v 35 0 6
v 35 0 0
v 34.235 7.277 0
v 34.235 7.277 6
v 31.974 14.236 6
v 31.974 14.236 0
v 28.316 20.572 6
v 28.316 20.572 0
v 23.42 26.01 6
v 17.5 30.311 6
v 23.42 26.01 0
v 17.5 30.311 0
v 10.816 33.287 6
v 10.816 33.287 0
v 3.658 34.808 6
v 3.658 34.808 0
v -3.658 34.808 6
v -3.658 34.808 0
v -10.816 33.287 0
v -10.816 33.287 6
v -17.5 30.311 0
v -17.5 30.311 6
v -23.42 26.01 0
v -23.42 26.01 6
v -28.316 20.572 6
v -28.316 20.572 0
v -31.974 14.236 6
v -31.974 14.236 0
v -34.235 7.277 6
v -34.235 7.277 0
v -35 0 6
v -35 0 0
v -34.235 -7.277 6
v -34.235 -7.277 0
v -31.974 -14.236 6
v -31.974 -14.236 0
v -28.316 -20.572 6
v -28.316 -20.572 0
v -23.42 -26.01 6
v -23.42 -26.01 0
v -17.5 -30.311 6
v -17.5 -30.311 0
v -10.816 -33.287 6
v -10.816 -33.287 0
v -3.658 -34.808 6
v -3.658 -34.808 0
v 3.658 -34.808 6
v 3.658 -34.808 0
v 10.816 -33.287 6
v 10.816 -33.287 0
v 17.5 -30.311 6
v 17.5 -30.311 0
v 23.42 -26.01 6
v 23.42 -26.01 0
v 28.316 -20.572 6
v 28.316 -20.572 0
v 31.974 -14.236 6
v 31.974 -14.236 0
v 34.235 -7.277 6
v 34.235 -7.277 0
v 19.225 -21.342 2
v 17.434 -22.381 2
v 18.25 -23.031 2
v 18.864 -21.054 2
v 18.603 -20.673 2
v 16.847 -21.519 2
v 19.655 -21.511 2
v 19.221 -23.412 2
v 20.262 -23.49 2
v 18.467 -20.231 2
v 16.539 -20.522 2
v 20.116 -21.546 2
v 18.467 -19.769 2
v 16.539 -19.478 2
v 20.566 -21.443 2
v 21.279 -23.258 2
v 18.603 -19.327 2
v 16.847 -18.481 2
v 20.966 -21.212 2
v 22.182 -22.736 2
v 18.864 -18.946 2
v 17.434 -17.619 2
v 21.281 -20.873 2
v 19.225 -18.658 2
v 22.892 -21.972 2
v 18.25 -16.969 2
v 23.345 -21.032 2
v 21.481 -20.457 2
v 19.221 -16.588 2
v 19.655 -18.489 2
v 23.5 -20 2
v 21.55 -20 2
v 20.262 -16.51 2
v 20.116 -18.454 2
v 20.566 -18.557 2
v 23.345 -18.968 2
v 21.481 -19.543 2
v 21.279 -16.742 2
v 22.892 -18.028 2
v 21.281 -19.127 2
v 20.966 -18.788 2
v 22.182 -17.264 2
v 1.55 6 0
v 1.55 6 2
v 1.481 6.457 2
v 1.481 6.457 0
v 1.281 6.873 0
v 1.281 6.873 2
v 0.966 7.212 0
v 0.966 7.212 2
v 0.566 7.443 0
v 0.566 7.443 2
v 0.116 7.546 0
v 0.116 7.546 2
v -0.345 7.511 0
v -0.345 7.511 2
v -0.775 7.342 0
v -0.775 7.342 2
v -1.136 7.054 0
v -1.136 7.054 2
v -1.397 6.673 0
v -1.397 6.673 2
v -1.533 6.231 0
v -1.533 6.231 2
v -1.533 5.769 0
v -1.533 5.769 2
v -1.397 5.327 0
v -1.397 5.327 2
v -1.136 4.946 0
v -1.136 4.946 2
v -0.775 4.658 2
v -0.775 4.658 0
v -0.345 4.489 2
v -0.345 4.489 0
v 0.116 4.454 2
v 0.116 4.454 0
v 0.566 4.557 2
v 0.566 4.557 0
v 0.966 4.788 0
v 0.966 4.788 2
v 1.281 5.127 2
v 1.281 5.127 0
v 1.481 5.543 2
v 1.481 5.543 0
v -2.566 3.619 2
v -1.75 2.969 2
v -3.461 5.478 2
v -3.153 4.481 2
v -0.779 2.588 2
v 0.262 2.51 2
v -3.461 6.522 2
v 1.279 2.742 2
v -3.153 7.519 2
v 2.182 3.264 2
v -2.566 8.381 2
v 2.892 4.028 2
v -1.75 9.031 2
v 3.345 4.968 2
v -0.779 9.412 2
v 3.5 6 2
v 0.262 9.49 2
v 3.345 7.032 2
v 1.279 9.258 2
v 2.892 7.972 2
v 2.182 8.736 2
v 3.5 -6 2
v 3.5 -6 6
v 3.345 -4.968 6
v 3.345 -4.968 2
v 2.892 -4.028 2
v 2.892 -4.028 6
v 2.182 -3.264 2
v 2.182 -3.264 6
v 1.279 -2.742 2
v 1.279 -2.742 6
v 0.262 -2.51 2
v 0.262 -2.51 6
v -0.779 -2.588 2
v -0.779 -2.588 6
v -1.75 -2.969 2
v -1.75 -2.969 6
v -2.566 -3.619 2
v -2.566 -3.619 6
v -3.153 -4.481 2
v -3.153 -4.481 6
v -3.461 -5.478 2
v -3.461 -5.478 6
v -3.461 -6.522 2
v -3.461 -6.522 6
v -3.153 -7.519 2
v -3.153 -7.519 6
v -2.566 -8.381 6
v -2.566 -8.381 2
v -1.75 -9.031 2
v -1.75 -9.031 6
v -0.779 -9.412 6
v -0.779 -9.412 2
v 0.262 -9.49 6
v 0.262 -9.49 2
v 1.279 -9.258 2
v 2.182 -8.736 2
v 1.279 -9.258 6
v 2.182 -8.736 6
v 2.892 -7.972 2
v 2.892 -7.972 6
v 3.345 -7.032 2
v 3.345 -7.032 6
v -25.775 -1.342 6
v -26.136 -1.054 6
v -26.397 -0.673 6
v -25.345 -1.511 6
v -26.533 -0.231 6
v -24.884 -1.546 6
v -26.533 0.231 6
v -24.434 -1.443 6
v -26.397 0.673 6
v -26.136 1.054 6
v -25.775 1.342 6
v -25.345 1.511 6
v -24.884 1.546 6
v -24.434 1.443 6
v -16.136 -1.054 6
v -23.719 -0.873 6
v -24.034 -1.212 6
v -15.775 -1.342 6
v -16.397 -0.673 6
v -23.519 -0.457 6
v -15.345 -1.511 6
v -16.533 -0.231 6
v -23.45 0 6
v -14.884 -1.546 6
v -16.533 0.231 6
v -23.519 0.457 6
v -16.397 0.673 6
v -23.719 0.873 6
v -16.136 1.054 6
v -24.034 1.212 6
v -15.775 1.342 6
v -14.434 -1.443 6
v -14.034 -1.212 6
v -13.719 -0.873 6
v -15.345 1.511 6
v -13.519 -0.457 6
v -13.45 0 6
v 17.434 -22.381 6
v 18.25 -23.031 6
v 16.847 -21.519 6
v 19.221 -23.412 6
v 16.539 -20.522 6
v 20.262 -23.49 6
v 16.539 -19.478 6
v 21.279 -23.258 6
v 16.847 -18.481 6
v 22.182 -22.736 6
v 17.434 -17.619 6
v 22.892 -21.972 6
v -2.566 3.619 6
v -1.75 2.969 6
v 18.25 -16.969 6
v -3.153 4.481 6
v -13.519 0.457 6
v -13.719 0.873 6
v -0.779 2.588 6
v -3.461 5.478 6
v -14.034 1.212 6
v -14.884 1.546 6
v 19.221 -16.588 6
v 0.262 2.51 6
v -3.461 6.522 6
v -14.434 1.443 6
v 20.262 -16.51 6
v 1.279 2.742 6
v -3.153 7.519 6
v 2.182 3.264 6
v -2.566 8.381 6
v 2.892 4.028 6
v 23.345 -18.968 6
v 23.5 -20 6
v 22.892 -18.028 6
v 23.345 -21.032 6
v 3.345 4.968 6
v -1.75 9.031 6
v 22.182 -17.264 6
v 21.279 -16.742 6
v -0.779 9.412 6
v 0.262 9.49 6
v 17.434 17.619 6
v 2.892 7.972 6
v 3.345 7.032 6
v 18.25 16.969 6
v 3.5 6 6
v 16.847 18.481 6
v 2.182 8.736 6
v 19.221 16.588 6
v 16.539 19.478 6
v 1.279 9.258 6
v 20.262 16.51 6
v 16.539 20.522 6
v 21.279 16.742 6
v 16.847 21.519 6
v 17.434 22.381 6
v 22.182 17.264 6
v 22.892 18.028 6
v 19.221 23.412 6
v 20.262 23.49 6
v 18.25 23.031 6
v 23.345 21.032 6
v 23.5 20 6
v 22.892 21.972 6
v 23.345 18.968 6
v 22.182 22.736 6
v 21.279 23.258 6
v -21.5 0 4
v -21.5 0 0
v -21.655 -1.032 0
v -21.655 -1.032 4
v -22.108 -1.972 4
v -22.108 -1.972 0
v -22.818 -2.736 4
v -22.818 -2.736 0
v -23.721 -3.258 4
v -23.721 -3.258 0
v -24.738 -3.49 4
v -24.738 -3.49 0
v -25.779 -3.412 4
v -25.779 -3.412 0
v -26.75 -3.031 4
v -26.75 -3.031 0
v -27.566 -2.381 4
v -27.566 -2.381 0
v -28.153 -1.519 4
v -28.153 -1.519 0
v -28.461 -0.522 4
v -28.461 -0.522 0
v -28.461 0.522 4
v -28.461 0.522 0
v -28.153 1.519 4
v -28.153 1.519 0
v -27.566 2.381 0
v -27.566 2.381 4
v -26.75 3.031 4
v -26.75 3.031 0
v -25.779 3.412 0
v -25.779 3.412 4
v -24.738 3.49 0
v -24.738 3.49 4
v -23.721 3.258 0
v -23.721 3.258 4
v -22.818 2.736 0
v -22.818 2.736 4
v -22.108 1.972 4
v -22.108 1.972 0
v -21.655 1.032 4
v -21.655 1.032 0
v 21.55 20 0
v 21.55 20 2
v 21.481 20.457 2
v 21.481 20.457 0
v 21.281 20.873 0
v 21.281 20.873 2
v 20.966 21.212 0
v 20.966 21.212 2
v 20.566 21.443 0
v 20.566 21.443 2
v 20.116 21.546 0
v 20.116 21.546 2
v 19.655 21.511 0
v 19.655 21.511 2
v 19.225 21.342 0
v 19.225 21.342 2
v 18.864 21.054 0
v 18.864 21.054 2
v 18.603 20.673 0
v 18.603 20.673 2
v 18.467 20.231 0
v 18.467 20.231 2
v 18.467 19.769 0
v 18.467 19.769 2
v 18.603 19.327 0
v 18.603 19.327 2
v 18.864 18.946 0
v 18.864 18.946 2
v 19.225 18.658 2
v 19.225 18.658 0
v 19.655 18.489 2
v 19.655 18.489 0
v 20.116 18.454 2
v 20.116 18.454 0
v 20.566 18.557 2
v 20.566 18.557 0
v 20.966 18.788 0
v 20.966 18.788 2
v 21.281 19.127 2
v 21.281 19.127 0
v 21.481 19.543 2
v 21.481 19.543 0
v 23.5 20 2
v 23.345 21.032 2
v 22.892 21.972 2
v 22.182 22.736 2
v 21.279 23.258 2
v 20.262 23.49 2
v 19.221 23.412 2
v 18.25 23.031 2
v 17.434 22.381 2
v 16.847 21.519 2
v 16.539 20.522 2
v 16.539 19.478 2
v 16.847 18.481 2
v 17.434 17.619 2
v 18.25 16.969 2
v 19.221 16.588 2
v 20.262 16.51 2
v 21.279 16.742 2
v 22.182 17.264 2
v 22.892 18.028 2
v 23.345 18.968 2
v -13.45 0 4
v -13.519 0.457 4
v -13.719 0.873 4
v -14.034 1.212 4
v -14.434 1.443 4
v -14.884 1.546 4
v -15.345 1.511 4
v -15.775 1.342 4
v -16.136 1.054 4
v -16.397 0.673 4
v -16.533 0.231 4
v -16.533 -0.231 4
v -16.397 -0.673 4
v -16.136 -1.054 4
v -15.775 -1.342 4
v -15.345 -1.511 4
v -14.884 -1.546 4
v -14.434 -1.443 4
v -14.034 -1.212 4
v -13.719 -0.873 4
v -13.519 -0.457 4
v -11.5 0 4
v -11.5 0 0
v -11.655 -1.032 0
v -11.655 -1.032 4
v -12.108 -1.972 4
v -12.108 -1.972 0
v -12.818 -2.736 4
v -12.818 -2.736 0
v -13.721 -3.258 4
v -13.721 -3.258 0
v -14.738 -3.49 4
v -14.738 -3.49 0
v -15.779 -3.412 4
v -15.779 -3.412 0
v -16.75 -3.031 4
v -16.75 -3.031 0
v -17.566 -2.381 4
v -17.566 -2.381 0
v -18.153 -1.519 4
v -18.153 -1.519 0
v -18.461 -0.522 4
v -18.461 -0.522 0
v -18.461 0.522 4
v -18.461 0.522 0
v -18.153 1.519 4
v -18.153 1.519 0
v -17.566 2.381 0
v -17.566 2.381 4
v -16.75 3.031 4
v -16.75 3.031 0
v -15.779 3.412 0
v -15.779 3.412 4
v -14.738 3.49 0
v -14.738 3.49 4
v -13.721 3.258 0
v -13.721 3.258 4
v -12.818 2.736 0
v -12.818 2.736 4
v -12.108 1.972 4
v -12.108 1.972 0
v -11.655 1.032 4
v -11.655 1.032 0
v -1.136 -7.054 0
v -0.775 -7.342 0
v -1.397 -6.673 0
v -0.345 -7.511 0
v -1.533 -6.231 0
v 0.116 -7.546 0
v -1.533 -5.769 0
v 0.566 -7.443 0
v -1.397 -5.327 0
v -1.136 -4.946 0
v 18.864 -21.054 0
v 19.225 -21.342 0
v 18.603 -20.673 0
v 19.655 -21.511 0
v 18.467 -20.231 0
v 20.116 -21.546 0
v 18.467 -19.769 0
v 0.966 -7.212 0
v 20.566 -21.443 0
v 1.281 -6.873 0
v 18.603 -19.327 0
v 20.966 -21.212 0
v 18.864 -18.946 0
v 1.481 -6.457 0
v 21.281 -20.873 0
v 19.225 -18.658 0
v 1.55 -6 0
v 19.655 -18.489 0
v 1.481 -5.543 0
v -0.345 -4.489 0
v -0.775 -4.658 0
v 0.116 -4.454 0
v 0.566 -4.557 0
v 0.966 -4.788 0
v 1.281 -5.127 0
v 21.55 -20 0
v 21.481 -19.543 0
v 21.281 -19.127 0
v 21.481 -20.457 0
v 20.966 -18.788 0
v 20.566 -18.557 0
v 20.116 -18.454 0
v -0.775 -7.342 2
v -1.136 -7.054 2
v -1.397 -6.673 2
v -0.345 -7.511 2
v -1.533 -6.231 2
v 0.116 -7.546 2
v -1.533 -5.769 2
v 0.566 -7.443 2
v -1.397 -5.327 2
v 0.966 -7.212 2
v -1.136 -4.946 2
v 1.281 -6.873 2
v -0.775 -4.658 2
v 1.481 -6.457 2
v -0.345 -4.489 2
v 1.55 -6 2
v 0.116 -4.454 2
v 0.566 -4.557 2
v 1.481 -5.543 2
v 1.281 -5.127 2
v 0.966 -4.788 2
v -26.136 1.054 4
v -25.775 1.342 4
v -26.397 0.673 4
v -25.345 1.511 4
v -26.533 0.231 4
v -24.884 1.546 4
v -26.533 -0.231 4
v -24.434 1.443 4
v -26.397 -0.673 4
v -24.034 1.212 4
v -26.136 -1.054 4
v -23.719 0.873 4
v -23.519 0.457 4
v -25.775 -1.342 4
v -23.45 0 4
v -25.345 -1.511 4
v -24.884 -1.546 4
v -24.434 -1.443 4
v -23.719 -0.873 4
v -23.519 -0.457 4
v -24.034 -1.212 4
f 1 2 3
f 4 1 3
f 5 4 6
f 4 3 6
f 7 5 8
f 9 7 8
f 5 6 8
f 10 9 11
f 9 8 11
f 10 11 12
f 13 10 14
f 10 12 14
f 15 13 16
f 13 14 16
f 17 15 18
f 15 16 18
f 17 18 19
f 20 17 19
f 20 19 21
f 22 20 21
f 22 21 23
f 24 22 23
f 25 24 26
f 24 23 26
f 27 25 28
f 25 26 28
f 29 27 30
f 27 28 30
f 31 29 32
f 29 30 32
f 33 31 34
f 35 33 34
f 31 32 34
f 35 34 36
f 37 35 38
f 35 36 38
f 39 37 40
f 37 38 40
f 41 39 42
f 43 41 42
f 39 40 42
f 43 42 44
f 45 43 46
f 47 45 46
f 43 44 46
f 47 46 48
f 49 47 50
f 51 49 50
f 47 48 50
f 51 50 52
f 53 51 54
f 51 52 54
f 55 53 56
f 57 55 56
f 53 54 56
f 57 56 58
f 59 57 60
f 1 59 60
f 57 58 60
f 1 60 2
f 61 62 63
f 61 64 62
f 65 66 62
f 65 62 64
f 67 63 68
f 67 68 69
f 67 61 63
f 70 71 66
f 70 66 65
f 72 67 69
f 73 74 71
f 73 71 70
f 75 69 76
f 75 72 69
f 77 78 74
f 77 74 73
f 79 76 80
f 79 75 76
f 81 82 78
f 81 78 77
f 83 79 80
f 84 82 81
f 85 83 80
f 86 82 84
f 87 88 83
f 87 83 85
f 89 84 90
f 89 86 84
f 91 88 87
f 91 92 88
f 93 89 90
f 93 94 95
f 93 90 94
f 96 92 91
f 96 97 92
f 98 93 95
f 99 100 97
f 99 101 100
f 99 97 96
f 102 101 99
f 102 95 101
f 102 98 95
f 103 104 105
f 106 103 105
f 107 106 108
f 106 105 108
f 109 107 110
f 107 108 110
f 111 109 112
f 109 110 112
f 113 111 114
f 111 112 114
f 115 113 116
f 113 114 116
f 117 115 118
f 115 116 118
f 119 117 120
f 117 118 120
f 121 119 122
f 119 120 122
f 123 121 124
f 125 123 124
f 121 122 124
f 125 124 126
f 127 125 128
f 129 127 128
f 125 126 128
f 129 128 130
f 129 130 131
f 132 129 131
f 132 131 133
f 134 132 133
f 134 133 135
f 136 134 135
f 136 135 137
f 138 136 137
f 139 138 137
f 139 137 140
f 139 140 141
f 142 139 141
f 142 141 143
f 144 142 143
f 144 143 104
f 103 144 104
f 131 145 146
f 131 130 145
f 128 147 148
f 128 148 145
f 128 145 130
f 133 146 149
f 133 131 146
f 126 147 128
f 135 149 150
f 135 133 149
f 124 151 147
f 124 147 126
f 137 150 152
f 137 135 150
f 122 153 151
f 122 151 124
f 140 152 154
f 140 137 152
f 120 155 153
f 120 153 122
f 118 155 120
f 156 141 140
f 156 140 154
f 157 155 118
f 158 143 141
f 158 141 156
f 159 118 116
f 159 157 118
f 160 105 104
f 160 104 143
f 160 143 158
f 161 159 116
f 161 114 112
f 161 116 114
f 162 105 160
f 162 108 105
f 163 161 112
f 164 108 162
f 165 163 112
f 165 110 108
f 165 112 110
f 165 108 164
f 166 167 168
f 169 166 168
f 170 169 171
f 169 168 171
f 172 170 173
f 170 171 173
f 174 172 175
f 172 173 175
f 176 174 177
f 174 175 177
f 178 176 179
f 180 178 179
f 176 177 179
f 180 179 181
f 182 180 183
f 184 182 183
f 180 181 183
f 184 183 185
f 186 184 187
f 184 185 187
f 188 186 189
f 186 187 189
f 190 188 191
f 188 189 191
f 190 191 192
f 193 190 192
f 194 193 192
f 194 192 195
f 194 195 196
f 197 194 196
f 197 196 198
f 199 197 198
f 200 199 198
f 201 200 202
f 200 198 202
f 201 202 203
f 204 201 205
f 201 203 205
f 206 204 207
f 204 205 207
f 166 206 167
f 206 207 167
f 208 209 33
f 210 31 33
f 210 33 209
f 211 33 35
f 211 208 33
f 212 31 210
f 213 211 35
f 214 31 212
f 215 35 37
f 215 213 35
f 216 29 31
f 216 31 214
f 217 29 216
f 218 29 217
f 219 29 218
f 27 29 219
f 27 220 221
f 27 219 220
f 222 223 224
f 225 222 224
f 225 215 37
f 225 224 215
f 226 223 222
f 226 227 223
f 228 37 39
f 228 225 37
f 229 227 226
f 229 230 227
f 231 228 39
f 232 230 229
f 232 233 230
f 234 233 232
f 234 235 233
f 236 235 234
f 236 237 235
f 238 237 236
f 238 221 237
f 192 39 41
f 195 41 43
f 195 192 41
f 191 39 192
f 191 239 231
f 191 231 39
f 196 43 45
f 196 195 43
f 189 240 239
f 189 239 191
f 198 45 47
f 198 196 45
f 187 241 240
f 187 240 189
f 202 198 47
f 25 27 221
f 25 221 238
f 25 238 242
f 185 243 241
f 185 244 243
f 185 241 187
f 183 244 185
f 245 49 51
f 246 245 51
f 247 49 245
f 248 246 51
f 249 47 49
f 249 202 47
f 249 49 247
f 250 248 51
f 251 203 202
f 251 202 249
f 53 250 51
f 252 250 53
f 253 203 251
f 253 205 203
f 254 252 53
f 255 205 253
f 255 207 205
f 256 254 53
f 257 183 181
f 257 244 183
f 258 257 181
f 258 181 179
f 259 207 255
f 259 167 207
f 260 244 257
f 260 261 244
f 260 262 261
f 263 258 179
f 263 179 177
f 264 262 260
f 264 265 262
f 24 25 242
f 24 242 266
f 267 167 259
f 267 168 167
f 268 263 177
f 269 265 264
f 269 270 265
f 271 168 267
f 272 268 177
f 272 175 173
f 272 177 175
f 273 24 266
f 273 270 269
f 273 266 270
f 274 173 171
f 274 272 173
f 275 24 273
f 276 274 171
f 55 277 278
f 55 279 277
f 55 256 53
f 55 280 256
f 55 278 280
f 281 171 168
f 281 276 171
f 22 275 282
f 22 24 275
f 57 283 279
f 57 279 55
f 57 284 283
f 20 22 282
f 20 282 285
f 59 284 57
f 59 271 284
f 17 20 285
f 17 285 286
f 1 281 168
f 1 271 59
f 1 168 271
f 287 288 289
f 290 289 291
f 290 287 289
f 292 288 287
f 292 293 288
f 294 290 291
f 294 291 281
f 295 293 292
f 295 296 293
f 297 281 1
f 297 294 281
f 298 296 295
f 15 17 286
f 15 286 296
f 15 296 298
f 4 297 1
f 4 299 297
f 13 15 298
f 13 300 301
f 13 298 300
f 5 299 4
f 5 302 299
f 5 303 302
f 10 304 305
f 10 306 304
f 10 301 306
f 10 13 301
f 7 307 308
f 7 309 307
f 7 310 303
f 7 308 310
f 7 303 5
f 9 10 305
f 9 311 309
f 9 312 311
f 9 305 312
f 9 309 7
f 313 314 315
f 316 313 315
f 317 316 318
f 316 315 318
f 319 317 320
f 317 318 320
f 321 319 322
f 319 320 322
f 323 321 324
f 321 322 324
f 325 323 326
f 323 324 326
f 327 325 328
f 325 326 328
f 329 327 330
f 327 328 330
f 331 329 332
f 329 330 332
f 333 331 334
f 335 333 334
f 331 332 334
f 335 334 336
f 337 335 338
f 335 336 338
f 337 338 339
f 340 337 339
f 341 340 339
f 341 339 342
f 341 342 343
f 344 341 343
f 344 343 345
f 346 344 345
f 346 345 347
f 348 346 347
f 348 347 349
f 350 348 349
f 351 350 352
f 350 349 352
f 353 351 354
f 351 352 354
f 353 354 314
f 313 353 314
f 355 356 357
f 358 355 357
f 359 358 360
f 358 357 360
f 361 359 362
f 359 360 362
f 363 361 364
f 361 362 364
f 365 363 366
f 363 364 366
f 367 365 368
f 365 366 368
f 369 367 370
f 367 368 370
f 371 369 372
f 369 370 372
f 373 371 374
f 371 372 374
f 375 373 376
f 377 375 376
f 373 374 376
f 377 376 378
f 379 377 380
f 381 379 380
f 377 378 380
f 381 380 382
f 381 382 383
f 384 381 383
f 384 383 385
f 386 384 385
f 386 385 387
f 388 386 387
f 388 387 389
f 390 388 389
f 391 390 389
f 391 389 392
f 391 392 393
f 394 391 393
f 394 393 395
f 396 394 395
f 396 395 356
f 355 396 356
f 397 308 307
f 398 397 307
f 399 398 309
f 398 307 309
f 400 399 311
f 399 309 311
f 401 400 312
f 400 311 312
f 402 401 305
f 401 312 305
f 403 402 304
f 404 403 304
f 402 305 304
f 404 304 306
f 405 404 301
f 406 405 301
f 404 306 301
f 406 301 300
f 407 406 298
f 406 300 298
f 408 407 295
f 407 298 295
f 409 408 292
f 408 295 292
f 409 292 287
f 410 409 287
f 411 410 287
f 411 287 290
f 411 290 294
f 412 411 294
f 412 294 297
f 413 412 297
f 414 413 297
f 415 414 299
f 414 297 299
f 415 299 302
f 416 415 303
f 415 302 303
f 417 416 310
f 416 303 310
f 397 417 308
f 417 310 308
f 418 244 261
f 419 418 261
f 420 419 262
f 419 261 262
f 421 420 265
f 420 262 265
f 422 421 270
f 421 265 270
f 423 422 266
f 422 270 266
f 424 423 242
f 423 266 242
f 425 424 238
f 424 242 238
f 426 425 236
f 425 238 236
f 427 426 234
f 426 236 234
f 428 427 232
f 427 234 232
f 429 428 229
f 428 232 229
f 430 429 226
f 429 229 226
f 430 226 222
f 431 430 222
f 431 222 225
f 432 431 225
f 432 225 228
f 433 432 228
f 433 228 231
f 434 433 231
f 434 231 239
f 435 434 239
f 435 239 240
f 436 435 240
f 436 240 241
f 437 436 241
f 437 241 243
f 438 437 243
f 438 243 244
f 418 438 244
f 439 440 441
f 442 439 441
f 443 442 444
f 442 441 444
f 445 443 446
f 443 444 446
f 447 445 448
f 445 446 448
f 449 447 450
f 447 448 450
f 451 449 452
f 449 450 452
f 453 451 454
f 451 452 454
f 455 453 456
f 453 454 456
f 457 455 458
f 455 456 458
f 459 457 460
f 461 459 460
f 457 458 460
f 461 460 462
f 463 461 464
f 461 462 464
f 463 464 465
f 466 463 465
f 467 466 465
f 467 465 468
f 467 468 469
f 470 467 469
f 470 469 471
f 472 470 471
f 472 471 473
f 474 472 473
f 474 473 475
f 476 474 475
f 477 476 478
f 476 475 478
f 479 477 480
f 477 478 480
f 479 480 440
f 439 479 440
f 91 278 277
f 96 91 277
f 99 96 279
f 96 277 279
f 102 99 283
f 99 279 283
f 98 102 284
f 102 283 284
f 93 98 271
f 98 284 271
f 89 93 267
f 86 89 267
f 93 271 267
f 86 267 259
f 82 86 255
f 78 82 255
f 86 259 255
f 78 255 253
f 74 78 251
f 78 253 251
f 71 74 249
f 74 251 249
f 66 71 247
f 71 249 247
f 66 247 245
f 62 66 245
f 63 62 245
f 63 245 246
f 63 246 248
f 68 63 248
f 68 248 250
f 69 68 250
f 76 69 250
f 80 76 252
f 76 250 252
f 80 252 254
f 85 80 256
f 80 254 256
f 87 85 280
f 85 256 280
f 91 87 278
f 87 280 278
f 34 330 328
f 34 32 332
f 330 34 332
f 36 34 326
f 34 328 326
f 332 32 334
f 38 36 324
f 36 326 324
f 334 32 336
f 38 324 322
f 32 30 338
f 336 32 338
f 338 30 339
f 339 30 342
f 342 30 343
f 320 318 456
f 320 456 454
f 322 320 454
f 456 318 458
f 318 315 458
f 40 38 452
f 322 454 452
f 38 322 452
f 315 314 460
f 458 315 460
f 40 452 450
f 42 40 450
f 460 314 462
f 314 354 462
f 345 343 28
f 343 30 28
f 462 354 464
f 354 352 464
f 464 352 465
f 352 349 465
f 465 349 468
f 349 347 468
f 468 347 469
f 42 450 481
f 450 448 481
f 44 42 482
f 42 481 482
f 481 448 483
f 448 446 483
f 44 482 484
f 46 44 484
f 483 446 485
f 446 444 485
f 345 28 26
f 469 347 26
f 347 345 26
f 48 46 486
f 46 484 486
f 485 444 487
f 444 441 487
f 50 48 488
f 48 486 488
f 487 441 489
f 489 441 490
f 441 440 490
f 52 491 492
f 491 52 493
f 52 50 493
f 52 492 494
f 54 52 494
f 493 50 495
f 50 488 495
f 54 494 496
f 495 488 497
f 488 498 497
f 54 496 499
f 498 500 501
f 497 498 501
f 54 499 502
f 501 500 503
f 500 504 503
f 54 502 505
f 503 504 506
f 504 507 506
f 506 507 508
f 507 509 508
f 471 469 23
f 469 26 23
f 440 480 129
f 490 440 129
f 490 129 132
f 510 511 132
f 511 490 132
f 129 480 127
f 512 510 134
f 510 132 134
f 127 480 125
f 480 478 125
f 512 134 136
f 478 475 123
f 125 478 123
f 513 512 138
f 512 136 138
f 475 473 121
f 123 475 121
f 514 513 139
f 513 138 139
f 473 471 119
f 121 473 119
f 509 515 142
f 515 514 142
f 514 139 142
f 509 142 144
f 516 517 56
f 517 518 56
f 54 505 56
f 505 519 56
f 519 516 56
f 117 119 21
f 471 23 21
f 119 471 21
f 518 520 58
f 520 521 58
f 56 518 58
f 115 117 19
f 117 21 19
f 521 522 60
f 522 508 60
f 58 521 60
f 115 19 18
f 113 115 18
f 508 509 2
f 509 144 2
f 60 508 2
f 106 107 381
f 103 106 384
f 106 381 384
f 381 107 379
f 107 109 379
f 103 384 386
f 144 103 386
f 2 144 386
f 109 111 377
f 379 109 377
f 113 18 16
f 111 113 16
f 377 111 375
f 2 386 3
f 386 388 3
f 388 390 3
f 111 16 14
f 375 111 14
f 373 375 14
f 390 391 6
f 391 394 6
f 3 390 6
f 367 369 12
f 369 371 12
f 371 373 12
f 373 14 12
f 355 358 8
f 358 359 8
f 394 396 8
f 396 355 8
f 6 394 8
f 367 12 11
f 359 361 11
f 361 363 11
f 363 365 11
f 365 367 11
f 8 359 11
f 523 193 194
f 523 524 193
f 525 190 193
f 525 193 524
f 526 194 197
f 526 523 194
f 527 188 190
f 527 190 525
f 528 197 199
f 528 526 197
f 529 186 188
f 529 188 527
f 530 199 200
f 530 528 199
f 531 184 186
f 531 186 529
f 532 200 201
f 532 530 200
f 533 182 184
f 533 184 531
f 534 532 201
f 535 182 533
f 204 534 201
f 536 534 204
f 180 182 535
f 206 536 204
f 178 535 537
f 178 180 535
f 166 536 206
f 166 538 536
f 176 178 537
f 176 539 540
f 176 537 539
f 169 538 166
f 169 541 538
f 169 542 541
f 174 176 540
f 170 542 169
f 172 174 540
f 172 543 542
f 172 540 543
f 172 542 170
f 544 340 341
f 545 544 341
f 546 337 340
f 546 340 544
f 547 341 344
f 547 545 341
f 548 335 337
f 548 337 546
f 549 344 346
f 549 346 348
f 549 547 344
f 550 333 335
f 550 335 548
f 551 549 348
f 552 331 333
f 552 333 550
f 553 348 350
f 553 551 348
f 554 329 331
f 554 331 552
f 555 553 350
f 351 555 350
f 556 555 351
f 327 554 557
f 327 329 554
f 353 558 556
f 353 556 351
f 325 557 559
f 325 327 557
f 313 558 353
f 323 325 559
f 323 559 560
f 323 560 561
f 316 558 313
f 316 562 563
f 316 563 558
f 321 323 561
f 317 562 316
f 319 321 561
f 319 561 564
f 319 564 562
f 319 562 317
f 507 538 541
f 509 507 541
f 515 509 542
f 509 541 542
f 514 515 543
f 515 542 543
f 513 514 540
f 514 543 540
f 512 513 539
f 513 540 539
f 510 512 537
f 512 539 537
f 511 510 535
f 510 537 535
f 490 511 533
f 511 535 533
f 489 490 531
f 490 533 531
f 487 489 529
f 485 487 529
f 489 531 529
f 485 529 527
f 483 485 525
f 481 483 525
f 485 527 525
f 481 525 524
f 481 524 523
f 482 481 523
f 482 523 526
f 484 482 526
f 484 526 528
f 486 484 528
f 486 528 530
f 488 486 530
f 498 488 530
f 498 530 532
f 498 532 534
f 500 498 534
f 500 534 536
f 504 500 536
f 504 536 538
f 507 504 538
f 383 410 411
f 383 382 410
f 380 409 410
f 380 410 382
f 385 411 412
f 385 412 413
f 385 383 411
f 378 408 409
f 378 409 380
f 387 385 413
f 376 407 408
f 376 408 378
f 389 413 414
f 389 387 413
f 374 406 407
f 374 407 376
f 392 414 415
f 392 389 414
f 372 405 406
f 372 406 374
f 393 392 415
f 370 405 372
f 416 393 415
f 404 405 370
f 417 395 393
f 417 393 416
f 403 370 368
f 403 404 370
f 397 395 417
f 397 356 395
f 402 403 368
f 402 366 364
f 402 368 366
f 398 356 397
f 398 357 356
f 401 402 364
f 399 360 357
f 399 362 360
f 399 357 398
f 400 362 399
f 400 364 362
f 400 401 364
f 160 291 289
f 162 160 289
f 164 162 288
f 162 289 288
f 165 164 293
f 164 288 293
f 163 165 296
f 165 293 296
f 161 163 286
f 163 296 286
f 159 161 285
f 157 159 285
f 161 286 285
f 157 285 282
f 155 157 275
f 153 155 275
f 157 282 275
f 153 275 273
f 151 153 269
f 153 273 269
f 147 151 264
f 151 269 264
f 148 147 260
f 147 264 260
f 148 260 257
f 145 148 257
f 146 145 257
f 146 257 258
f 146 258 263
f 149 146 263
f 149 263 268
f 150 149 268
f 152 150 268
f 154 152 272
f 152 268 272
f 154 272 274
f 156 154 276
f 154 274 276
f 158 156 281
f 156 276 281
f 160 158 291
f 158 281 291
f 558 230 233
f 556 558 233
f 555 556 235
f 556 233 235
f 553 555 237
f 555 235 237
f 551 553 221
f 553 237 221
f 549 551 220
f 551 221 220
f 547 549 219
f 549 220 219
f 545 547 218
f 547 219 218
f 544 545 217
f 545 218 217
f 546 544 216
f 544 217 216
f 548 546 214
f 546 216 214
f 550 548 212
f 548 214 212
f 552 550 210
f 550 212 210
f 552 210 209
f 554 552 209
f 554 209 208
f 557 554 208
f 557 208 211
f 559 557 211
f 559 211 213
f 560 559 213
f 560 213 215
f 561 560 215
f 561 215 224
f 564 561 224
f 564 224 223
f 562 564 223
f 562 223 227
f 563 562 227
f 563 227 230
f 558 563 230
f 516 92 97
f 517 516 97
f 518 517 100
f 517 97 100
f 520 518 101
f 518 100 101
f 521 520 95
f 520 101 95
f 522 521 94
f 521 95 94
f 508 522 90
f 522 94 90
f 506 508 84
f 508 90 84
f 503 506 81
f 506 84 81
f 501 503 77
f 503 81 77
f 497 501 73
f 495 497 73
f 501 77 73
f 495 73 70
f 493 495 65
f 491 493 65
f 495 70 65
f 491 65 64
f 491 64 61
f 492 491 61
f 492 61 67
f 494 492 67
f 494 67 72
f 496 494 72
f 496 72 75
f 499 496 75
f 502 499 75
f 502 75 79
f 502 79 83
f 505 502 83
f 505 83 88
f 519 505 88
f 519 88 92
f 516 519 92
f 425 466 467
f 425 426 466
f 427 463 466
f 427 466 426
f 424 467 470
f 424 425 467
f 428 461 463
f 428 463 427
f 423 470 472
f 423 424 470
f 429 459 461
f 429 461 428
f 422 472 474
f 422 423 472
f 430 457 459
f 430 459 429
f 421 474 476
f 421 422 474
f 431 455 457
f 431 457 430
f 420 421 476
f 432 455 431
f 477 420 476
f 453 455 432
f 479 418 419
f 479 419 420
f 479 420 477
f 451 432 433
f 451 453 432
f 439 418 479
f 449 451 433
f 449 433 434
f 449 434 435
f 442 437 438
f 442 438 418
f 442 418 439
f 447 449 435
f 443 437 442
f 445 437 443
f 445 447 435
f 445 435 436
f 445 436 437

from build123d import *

# Parameters (mm, degrees)
F0_R     = 35
F1_DEPTH = 6
F2_R     = 1.55
F3_DEPTH = 6
F4_R     = 3.5
F4_R_2   = 1.55
F5_DEPTH = 4
F6_R     = 3.5
F7_DEPTH = 4


# Not quite as in the source:
# - a feature names something its author has since deleted; it is built from what else it names


with BuildPart() as f1:
    # F0 (on Top) → F1 (new body)
    with BuildSketch(Plane.XY):
        Circle(F0_R)
    extrude(amount=F1_DEPTH)

    # F2 (on face) → F3 (cut, through all)
    with BuildSketch(Plane.XY.offset(6)):
        with Locations((0, 6)):
            Circle(F2_R)
        with Locations((0, -6)):
            Circle(F2_R)
        with Locations((20, 20)):
            Circle(F2_R)
        with Locations((20, -20)):
            Circle(F2_R)
        with Locations((-15, 0)):
            Circle(F2_R)
        with Locations((-25, 0)):
            Circle(F2_R)
    extrude(amount=-F3_DEPTH, mode=Mode.SUBTRACT)

    # F4 (on face) → F5 (cut)
    with BuildSketch(Plane.XY.offset(6)):
        with Locations((0, -6)):
            Circle(F4_R)
        with Locations((0, 6)):
            Circle(F4_R)
        with Locations((20, -20)):
            Circle(F4_R)
        with Locations((20, 20)):
            Circle(F4_R)
        with Locations((20, 20)):
            Circle(F4_R_2)
        with Locations((20, -20)):
            Circle(F4_R_2)
    extrude(amount=-F5_DEPTH, mode=Mode.SUBTRACT)

    # F6 (on face) → F7 (cut)
    with BuildSketch(Plane(origin=(0, 0, 0), x_dir=(1, 0, 0), z_dir=(0, 0, -1))):
        with Locations((-25, 0)):
            Circle(F6_R)
        with Locations((-15, 0)):
            Circle(F6_R)
    extrude(amount=-F7_DEPTH, mode=Mode.SUBTRACT)


solid = f1.part
